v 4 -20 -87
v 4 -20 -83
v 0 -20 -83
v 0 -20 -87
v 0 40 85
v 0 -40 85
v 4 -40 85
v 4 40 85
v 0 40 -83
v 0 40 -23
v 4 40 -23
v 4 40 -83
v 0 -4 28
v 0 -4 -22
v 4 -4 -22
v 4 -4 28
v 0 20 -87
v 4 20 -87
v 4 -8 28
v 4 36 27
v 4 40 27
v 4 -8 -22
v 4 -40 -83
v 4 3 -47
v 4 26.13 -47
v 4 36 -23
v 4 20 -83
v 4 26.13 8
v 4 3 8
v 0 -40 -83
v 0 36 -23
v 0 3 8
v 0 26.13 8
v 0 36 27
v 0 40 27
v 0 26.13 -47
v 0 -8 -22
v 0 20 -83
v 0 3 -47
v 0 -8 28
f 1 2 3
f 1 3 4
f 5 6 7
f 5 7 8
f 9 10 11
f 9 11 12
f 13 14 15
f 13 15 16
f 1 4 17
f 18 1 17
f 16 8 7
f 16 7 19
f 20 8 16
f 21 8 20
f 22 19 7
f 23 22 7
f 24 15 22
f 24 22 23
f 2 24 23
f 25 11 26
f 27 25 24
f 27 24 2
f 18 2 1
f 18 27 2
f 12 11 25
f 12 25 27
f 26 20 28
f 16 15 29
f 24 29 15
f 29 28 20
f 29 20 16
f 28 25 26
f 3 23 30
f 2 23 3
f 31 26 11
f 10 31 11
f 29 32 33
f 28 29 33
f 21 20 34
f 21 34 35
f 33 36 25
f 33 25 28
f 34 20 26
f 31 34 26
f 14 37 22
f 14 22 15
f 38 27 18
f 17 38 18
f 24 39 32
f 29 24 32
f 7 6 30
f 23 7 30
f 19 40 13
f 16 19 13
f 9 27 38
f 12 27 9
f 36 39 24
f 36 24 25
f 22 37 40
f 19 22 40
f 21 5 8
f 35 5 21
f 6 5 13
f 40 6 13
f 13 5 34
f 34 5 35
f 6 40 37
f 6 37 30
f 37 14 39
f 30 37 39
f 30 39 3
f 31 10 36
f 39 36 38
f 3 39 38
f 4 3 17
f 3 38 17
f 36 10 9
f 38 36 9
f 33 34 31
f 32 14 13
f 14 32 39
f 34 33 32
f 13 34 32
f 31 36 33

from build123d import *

# Parameters (mm, degrees)
SKETCH_1_W          = 174
SKETCH_1_H          = 80
EXTRUDE_1_DEPTH     = 4
SKETCH_3_W          = 4
SKETCH_3_H          = 20
CUT_EXTRUDE_1_DEPTH = 4
SKETCH_4_W          = 50
SKETCH_4_H          = 4
CUT_EXTRUDE_2_DEPTH = 4
SKETCH_5_W          = 2
SKETCH_5_H          = 80
CUT_EXTRUDE_3_DEPTH = 10
SKETCH_8_W          = 50
SKETCH_8_H          = 4
CUT_EXTRUDE_4_DEPTH = 4
SKETCH_9_W          = 55
SKETCH_9_H          = 23.130254534
CUT_EXTRUDE_5_DEPTH = 4


with BuildPart() as part:
    # 스케치1 → 보스-돌출1 (new body)
    with BuildSketch(Plane(origin=(0, 0, 0), x_dir=(0, 0, -1), z_dir=(1, 0, 0))):
        Rectangle(SKETCH_1_W, SKETCH_1_H)
    extrude(amount=EXTRUDE_1_DEPTH)

    # 스케치3 → 컷-돌출1 (cut)
    with BuildSketch(Plane(origin=(4, 0, 0), x_dir=(0, 0, -1), z_dir=(1, 0, 0))):
        with Locations((85, 30)):
            Rectangle(SKETCH_3_W, SKETCH_3_H)
        with Locations((85, -30)):
            Rectangle(SKETCH_3_W, SKETCH_3_H)
    extrude(amount=-CUT_EXTRUDE_1_DEPTH, mode=Mode.SUBTRACT)

    # 스케치4 → 컷-돌출2 (cut)
    with BuildSketch(Plane(origin=(4, 0, 0), x_dir=(0, 0, -1), z_dir=(1, 0, 0))):
        with Locations((-2, 38)):
            Rectangle(SKETCH_4_W, SKETCH_4_H)
    extrude(amount=-CUT_EXTRUDE_2_DEPTH, mode=Mode.SUBTRACT)

    # 스케치5 → 컷-돌출3 (cut)
    with BuildSketch(Plane.ZY):
        with Locations((86, 0)):
            Rectangle(SKETCH_5_W, SKETCH_5_H)
    extrude(amount=-CUT_EXTRUDE_3_DEPTH, mode=Mode.SUBTRACT)

    # 스케치8 → 컷-돌출4 (cut)
    with BuildSketch(Plane.ZY):
        with Locations((3, -6)):
            Rectangle(SKETCH_8_W, SKETCH_8_H)
    extrude(amount=-CUT_EXTRUDE_4_DEPTH, mode=Mode.SUBTRACT)

    # 스케치9 → 컷-돌출5 (cut)
    with BuildSketch(Plane.ZY):
        with Locations((-19.5, 14.565127267)):
            Rectangle(SKETCH_9_W, SKETCH_9_H)
    extrude(amount=-CUT_EXTRUDE_5_DEPTH, mode=Mode.SUBTRACT)


solid = part.part
